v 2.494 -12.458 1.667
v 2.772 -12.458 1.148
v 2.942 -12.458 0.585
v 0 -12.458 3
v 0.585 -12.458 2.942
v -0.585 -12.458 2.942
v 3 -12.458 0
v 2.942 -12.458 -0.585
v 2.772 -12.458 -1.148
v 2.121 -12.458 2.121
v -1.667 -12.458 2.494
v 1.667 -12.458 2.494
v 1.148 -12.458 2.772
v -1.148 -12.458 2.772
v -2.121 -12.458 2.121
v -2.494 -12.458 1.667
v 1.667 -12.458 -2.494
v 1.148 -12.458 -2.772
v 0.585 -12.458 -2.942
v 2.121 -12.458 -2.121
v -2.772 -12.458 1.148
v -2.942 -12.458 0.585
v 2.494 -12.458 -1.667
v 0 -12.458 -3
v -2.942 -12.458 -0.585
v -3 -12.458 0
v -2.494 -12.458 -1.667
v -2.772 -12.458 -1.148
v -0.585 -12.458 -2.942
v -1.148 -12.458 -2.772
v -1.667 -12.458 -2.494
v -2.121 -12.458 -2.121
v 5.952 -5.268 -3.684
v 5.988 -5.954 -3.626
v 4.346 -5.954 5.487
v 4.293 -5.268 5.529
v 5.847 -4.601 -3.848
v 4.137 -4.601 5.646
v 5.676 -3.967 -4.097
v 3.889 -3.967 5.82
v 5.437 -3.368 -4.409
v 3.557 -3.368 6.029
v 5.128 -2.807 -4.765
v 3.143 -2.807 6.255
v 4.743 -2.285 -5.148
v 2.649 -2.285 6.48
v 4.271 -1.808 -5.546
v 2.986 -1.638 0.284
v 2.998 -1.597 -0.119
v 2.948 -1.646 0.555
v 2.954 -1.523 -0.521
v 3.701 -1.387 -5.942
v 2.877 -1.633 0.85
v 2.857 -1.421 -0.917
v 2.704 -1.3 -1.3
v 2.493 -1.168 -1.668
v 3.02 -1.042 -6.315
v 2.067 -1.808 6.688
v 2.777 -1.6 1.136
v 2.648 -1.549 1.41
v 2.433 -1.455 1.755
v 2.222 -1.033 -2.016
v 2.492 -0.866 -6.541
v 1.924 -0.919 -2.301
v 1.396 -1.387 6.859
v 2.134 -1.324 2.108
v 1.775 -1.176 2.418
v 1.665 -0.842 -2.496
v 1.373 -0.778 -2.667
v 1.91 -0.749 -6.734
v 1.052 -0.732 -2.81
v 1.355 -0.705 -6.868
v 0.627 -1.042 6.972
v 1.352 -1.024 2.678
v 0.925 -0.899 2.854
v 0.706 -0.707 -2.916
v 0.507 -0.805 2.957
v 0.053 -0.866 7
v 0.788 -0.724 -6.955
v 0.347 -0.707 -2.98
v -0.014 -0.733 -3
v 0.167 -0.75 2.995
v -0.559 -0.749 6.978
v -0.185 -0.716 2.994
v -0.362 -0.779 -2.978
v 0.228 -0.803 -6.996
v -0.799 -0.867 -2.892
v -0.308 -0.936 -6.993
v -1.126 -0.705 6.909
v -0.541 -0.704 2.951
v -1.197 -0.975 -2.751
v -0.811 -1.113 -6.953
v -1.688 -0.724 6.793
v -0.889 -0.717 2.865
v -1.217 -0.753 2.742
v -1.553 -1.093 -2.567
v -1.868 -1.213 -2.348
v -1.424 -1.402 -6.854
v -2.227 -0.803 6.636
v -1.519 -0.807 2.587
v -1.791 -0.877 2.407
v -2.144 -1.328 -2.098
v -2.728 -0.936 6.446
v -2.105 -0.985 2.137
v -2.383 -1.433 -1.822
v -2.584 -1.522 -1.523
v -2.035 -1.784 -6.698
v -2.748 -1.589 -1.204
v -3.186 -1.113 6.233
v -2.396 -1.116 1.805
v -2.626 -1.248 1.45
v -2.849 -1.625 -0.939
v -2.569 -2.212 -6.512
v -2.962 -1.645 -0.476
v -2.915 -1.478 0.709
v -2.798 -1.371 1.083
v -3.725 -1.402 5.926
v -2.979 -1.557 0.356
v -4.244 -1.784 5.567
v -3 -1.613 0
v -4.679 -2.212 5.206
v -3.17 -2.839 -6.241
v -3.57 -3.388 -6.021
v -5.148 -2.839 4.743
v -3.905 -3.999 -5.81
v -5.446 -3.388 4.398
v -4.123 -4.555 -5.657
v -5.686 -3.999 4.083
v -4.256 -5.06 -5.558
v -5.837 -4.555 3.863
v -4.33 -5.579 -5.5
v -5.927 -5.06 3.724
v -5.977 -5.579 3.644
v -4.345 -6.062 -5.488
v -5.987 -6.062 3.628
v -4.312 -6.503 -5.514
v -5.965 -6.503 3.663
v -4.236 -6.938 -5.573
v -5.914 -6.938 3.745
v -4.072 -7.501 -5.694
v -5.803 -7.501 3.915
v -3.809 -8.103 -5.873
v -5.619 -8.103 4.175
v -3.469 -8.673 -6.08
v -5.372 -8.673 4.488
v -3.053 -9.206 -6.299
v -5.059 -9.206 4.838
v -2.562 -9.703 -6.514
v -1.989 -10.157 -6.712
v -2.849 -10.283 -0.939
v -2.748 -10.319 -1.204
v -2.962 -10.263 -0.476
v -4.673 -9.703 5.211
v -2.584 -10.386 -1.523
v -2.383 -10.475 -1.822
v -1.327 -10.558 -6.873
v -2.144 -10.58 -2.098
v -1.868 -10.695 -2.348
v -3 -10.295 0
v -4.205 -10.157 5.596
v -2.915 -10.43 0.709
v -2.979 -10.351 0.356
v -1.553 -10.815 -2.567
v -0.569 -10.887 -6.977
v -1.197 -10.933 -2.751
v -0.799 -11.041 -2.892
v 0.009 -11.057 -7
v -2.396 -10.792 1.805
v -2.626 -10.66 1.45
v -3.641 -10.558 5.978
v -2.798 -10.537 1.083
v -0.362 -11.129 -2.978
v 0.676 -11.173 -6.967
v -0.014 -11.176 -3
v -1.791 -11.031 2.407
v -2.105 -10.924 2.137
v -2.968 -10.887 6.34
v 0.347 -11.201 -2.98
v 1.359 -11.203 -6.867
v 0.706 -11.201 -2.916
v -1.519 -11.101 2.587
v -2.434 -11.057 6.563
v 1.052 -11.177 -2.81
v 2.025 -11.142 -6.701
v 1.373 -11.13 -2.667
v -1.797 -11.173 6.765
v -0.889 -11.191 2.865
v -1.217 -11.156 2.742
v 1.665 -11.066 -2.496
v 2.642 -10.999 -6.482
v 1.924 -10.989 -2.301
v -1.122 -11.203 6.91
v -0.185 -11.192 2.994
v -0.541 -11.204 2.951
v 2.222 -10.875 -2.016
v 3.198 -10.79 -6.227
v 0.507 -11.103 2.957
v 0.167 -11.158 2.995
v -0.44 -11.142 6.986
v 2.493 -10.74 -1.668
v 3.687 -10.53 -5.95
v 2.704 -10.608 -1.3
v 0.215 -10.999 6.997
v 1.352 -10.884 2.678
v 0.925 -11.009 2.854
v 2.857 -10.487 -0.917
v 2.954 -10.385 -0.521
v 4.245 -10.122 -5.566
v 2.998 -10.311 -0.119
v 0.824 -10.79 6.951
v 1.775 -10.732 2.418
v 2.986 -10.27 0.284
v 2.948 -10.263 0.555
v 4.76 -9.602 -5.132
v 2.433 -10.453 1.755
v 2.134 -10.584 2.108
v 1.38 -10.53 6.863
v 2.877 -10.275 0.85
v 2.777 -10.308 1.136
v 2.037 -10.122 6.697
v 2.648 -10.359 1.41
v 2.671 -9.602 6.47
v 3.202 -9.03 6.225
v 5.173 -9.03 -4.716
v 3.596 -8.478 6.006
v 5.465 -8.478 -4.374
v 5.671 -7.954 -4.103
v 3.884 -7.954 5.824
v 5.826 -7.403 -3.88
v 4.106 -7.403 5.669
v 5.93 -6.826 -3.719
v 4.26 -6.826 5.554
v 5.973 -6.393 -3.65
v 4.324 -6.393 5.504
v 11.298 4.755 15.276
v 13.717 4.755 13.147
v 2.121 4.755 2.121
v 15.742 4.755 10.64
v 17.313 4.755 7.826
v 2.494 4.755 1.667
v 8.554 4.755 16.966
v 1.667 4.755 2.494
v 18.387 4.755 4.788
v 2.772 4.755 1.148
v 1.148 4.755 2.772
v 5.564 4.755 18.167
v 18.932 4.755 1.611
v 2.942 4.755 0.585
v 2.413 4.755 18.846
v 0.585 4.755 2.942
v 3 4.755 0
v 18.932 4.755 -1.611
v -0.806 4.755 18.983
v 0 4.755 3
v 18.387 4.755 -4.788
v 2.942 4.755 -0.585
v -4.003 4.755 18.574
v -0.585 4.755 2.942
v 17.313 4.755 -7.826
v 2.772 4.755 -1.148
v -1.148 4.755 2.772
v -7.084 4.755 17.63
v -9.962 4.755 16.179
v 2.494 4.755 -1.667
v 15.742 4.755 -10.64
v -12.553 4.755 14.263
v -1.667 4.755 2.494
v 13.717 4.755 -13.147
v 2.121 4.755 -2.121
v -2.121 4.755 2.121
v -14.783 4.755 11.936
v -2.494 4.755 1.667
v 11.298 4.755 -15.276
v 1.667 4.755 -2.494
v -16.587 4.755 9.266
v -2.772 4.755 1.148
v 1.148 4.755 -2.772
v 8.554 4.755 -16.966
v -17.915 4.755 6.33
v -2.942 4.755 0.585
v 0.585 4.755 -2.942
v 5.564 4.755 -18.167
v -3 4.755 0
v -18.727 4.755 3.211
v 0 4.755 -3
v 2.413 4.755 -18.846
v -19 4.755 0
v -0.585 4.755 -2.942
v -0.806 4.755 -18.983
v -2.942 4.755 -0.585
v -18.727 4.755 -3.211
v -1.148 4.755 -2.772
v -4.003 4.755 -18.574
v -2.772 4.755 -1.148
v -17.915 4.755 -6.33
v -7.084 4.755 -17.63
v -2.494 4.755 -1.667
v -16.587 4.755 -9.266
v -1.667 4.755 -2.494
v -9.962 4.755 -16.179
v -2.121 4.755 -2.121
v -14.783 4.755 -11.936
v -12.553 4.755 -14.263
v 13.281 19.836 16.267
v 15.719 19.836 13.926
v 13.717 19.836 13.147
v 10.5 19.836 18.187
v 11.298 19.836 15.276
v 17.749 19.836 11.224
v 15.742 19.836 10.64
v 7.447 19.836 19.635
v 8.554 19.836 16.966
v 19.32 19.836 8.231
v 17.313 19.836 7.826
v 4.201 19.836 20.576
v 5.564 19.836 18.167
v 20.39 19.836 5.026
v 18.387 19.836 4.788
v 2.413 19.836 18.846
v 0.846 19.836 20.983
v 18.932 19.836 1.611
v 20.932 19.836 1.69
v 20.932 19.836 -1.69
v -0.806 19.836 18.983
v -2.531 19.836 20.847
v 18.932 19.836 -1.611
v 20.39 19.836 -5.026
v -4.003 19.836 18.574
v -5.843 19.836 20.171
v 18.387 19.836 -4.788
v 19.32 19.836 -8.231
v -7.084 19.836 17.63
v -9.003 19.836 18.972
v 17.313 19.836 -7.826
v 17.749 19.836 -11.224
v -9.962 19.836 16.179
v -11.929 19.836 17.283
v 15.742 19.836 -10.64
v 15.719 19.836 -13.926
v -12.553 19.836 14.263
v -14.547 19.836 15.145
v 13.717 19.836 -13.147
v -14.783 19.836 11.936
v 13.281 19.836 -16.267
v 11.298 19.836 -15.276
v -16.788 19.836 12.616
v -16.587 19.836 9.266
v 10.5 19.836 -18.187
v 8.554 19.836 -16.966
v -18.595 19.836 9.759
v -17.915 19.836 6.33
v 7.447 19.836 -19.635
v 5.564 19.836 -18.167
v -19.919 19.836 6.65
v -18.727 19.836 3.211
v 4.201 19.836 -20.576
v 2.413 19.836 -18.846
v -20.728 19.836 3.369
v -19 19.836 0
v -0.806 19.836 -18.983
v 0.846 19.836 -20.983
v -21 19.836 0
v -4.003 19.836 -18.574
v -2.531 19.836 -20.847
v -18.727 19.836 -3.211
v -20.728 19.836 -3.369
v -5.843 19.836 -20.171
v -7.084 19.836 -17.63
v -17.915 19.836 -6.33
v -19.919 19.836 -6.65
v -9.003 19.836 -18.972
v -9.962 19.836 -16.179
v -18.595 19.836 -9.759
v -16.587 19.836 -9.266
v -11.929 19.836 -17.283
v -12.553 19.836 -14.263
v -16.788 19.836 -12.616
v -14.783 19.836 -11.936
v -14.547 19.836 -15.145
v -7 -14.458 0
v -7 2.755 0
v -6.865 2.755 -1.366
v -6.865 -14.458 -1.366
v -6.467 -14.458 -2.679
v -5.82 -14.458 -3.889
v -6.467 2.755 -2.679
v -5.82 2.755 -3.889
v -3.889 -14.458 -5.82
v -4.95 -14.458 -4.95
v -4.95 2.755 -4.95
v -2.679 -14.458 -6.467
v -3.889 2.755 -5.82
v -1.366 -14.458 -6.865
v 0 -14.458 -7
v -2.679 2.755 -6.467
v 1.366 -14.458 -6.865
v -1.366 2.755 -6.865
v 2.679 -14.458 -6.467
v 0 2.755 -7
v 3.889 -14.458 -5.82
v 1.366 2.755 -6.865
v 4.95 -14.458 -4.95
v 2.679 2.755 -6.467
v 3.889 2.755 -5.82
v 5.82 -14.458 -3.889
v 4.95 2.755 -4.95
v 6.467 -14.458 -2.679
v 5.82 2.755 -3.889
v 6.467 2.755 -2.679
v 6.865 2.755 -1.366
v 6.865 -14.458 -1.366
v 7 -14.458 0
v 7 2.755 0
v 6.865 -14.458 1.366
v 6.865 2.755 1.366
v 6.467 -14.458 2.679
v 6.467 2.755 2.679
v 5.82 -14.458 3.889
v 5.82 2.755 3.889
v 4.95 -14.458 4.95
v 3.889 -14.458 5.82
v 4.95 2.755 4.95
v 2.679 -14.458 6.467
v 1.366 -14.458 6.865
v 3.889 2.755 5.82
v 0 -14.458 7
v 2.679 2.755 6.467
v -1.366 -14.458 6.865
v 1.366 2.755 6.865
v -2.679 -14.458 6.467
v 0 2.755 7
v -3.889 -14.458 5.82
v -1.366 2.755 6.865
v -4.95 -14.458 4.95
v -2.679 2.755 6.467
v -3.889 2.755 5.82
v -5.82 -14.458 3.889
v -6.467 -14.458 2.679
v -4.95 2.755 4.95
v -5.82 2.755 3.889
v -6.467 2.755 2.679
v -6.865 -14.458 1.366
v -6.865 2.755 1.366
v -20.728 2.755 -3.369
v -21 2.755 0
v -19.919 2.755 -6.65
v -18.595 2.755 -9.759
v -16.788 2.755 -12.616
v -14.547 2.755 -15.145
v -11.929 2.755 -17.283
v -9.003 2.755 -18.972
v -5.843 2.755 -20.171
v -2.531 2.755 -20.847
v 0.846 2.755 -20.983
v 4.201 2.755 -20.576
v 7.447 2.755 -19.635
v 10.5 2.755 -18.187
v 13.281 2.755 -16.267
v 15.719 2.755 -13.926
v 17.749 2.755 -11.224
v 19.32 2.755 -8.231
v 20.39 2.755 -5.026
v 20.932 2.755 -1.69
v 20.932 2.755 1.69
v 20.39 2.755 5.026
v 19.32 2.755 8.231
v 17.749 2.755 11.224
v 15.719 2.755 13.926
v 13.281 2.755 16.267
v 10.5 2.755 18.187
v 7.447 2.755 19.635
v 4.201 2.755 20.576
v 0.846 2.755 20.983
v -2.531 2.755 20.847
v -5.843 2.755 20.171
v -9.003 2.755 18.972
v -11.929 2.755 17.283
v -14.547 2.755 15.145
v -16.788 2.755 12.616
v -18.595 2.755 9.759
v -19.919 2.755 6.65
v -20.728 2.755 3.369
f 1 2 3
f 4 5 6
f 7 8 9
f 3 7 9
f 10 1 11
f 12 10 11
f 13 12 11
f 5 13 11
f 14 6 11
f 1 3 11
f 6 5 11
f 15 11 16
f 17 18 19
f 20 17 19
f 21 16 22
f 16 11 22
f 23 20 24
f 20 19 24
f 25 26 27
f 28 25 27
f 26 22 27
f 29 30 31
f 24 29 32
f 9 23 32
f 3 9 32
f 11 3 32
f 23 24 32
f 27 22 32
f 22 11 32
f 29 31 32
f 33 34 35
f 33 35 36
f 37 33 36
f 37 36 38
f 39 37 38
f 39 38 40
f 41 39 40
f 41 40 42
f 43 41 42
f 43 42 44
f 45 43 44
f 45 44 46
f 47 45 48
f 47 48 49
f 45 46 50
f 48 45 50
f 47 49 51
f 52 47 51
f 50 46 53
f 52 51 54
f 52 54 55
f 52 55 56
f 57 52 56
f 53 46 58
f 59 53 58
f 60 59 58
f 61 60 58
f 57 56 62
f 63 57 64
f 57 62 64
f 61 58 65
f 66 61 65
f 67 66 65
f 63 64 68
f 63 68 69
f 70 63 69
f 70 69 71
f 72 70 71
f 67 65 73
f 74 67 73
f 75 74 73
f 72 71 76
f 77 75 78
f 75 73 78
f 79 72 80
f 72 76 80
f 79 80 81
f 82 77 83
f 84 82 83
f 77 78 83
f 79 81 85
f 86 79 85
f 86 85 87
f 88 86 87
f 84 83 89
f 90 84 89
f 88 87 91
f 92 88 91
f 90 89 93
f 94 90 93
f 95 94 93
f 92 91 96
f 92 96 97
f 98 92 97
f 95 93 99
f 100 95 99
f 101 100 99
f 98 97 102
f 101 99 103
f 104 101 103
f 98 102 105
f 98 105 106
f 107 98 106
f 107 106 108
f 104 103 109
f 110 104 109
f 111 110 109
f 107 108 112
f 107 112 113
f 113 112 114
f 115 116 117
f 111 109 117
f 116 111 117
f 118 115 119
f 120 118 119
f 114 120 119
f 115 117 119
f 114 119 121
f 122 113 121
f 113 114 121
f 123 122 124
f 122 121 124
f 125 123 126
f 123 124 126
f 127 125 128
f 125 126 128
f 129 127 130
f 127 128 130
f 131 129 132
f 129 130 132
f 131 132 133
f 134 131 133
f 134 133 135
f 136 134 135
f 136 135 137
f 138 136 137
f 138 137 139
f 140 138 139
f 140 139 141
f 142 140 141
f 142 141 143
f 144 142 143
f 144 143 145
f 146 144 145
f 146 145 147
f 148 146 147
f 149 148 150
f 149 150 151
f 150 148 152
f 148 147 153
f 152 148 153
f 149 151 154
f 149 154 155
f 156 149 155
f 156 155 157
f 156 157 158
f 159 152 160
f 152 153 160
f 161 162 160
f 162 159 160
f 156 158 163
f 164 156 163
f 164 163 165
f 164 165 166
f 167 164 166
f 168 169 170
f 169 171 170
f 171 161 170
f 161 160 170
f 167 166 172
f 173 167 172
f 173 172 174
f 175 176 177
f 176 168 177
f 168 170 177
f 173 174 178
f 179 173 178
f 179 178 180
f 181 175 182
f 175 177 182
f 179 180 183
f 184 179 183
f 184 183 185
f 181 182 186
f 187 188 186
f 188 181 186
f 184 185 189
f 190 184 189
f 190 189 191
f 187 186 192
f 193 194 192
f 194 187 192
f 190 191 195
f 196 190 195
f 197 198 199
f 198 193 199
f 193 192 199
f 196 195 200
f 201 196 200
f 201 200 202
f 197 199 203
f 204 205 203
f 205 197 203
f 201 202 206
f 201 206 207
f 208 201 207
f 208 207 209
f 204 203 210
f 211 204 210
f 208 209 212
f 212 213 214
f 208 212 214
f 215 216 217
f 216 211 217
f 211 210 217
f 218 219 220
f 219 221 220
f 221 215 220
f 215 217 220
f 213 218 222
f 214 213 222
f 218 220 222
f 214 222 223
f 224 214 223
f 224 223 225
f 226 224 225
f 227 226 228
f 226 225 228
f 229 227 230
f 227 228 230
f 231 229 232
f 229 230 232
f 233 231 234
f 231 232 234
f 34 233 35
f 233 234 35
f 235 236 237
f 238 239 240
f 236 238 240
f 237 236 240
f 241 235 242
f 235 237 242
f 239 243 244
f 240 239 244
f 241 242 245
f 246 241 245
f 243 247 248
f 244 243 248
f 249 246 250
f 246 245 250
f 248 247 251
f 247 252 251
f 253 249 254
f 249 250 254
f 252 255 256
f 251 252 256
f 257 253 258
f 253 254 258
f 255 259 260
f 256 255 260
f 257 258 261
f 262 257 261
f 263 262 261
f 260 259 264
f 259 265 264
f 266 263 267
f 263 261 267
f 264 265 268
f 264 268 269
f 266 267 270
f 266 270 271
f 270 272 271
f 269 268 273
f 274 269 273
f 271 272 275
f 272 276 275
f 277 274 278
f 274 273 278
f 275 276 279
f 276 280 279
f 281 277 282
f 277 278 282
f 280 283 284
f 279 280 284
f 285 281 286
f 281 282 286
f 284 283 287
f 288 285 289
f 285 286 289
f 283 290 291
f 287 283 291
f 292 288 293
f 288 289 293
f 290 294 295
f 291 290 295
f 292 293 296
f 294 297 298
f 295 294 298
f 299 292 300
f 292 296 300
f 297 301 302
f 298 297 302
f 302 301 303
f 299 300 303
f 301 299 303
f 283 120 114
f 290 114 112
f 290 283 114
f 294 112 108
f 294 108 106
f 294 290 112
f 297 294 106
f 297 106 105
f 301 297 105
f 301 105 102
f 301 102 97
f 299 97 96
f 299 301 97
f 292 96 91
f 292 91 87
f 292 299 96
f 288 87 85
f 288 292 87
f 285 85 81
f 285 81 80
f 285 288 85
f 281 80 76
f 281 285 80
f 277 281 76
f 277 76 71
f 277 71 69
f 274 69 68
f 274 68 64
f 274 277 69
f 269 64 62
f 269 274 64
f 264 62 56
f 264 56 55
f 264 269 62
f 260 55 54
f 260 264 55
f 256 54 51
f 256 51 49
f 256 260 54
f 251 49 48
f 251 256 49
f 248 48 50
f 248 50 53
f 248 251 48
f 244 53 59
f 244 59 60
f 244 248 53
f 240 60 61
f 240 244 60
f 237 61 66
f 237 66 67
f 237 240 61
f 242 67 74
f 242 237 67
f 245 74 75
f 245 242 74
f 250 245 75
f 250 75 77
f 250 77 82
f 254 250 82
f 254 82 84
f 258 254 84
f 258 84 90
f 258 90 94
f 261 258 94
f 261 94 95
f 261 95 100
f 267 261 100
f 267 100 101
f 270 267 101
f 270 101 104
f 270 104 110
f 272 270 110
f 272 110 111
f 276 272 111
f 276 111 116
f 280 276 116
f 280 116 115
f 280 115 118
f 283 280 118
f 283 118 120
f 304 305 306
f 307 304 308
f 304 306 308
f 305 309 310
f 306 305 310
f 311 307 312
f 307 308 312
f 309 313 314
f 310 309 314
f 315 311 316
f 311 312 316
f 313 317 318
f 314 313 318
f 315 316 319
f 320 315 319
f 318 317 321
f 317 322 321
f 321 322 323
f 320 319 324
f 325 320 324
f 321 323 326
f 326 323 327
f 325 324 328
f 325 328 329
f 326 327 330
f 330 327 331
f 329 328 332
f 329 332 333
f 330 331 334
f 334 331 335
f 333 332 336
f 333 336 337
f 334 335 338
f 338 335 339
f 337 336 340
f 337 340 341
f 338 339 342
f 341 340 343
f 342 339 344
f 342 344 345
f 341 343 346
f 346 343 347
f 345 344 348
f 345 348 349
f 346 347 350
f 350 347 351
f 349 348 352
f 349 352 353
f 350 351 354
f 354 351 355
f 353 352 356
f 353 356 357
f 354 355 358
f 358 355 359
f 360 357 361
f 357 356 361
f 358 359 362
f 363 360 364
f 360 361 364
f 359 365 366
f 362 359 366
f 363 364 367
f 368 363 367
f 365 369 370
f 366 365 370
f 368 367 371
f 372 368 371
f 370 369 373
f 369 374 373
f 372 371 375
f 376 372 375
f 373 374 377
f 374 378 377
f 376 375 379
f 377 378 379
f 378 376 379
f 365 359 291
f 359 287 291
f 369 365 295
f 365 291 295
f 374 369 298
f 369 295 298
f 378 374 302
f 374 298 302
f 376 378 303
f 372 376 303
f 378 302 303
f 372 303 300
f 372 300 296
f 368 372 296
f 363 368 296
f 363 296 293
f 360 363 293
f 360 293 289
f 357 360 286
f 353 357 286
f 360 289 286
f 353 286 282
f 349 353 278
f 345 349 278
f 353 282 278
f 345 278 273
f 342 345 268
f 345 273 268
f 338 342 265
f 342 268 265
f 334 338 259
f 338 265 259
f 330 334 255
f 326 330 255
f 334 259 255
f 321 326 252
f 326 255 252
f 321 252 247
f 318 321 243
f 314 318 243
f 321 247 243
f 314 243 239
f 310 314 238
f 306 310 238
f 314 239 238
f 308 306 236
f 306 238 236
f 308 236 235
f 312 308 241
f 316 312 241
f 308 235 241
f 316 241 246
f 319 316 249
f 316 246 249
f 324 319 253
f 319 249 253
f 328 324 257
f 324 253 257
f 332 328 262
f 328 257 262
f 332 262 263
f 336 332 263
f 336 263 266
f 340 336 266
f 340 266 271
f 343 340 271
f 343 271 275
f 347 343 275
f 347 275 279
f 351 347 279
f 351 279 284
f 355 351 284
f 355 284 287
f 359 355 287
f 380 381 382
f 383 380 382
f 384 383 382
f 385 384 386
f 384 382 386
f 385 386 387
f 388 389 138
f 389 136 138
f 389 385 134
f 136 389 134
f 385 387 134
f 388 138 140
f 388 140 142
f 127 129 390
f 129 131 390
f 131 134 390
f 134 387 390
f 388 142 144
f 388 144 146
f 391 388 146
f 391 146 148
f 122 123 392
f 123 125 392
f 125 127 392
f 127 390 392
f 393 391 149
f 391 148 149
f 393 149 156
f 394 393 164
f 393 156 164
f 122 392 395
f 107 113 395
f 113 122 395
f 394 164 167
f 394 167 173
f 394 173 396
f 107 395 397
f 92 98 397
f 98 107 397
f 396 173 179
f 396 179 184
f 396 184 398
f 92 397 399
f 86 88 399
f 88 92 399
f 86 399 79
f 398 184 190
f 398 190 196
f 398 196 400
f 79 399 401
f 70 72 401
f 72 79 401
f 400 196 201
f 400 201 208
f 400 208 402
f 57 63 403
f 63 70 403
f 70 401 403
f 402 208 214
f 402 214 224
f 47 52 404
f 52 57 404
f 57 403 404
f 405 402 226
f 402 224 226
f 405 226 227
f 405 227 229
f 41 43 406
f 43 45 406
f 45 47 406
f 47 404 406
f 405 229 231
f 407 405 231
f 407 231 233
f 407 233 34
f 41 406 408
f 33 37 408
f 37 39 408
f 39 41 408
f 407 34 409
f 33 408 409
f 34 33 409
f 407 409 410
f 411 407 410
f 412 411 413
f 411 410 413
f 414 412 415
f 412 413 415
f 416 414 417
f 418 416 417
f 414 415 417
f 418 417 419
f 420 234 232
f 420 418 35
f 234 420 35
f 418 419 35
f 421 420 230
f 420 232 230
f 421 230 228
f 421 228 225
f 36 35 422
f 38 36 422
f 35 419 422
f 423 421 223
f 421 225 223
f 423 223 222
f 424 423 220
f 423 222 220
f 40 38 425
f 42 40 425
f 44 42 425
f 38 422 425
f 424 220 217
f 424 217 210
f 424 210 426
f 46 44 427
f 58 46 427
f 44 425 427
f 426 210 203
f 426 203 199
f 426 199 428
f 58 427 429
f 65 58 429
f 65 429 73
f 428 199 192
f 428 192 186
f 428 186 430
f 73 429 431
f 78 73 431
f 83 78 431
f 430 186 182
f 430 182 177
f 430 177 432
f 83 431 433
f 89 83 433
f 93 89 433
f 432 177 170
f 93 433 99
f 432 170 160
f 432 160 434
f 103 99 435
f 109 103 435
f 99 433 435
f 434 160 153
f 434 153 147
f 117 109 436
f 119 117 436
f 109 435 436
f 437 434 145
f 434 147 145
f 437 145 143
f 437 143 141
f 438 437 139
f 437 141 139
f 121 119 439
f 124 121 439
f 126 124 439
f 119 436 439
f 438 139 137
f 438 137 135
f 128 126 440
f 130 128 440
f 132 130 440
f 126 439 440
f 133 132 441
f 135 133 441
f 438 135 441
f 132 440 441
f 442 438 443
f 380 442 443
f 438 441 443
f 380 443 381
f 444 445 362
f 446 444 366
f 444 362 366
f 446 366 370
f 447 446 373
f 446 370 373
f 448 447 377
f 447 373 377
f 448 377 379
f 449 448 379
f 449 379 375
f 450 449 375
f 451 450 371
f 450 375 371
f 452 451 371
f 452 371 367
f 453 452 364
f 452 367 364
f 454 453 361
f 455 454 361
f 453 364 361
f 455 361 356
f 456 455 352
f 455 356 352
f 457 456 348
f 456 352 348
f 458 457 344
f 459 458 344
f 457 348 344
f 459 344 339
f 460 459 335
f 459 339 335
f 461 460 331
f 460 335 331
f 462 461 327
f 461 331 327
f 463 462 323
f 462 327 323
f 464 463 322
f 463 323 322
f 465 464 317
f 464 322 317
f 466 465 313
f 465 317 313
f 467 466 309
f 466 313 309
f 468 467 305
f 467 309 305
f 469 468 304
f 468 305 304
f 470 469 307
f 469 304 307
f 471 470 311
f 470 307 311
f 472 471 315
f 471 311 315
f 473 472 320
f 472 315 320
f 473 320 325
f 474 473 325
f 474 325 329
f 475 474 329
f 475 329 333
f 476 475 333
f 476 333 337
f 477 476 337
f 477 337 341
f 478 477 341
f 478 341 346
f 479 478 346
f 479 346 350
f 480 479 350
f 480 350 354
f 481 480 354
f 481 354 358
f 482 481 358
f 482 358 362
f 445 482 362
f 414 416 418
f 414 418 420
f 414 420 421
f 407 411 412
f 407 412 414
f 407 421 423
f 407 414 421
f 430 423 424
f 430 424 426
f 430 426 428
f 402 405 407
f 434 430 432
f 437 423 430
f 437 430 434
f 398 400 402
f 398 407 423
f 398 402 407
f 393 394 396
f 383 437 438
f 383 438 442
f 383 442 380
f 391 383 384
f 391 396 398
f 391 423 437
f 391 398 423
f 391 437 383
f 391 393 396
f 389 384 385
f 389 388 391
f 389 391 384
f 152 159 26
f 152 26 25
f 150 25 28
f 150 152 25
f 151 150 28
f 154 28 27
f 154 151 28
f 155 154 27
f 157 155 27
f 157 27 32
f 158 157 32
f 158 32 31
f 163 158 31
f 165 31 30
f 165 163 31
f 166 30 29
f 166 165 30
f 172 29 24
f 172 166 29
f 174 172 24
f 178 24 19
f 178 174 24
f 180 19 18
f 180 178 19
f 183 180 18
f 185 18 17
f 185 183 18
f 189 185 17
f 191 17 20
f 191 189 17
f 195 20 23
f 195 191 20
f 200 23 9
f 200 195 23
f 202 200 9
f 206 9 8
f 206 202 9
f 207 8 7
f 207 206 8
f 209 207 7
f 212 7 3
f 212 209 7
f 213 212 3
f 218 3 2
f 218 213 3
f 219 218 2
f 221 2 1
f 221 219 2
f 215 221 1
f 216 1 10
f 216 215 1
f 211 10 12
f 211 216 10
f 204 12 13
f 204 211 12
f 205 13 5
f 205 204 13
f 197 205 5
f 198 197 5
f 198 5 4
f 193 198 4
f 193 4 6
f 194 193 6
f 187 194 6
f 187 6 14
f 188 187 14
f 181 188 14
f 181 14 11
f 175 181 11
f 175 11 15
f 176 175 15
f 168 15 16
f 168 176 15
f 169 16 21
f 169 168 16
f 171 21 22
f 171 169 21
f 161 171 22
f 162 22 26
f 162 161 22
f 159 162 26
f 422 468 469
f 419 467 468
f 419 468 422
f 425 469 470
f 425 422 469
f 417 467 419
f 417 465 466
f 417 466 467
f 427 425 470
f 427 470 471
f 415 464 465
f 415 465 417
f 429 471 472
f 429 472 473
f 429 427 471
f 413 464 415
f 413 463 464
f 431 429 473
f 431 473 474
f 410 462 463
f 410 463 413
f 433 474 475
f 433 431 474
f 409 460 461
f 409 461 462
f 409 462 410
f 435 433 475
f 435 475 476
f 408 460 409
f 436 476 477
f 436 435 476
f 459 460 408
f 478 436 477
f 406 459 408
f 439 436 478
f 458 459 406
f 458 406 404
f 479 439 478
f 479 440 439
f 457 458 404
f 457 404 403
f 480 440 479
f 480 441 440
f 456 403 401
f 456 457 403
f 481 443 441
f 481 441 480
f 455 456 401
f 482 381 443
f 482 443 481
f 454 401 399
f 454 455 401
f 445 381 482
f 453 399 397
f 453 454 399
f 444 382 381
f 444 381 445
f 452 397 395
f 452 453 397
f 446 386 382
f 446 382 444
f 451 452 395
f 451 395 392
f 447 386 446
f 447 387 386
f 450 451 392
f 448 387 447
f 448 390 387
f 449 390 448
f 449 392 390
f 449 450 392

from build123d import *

# Parameters (mm, degrees)
TROU_TARAUD_G1_161_D = 10.5


with BuildPart() as part:
    # Esquisse2 → Révolution1 (revolve)
    with BuildSketch(Plane.XY):
        Polygon((-19, 19.83574186), (-19, 4.75482653), (-3, 4.75482653), (-3, 3.289391775), (-3, -12.457506315), (0, -12.457506315), (0, -14.457506315), (-4.744922372, -14.457506315), (-7, -14.457506315), (-7, 2.75482653), (-9.300232951, 2.75482653), (-21, 2.75482653), (-21, 19.83574186), align=None)
    revolve(axis=Axis((0, 8.523766276, 0), (0, -1, 0)))

    # Trou taraudé G1/161 (through all)
    with Locations(Plane(origin=(1.240708844, -5.954064023, -6.889168423), x_dir=(-0.984166917609, 0, -0.17724412059), z_dir=(0.17724412059, 0, -0.984166917609))):
        with Locations((0, 0)):
            Hole(TROU_TARAUD_G1_161_D / 2)


solid = part.part
